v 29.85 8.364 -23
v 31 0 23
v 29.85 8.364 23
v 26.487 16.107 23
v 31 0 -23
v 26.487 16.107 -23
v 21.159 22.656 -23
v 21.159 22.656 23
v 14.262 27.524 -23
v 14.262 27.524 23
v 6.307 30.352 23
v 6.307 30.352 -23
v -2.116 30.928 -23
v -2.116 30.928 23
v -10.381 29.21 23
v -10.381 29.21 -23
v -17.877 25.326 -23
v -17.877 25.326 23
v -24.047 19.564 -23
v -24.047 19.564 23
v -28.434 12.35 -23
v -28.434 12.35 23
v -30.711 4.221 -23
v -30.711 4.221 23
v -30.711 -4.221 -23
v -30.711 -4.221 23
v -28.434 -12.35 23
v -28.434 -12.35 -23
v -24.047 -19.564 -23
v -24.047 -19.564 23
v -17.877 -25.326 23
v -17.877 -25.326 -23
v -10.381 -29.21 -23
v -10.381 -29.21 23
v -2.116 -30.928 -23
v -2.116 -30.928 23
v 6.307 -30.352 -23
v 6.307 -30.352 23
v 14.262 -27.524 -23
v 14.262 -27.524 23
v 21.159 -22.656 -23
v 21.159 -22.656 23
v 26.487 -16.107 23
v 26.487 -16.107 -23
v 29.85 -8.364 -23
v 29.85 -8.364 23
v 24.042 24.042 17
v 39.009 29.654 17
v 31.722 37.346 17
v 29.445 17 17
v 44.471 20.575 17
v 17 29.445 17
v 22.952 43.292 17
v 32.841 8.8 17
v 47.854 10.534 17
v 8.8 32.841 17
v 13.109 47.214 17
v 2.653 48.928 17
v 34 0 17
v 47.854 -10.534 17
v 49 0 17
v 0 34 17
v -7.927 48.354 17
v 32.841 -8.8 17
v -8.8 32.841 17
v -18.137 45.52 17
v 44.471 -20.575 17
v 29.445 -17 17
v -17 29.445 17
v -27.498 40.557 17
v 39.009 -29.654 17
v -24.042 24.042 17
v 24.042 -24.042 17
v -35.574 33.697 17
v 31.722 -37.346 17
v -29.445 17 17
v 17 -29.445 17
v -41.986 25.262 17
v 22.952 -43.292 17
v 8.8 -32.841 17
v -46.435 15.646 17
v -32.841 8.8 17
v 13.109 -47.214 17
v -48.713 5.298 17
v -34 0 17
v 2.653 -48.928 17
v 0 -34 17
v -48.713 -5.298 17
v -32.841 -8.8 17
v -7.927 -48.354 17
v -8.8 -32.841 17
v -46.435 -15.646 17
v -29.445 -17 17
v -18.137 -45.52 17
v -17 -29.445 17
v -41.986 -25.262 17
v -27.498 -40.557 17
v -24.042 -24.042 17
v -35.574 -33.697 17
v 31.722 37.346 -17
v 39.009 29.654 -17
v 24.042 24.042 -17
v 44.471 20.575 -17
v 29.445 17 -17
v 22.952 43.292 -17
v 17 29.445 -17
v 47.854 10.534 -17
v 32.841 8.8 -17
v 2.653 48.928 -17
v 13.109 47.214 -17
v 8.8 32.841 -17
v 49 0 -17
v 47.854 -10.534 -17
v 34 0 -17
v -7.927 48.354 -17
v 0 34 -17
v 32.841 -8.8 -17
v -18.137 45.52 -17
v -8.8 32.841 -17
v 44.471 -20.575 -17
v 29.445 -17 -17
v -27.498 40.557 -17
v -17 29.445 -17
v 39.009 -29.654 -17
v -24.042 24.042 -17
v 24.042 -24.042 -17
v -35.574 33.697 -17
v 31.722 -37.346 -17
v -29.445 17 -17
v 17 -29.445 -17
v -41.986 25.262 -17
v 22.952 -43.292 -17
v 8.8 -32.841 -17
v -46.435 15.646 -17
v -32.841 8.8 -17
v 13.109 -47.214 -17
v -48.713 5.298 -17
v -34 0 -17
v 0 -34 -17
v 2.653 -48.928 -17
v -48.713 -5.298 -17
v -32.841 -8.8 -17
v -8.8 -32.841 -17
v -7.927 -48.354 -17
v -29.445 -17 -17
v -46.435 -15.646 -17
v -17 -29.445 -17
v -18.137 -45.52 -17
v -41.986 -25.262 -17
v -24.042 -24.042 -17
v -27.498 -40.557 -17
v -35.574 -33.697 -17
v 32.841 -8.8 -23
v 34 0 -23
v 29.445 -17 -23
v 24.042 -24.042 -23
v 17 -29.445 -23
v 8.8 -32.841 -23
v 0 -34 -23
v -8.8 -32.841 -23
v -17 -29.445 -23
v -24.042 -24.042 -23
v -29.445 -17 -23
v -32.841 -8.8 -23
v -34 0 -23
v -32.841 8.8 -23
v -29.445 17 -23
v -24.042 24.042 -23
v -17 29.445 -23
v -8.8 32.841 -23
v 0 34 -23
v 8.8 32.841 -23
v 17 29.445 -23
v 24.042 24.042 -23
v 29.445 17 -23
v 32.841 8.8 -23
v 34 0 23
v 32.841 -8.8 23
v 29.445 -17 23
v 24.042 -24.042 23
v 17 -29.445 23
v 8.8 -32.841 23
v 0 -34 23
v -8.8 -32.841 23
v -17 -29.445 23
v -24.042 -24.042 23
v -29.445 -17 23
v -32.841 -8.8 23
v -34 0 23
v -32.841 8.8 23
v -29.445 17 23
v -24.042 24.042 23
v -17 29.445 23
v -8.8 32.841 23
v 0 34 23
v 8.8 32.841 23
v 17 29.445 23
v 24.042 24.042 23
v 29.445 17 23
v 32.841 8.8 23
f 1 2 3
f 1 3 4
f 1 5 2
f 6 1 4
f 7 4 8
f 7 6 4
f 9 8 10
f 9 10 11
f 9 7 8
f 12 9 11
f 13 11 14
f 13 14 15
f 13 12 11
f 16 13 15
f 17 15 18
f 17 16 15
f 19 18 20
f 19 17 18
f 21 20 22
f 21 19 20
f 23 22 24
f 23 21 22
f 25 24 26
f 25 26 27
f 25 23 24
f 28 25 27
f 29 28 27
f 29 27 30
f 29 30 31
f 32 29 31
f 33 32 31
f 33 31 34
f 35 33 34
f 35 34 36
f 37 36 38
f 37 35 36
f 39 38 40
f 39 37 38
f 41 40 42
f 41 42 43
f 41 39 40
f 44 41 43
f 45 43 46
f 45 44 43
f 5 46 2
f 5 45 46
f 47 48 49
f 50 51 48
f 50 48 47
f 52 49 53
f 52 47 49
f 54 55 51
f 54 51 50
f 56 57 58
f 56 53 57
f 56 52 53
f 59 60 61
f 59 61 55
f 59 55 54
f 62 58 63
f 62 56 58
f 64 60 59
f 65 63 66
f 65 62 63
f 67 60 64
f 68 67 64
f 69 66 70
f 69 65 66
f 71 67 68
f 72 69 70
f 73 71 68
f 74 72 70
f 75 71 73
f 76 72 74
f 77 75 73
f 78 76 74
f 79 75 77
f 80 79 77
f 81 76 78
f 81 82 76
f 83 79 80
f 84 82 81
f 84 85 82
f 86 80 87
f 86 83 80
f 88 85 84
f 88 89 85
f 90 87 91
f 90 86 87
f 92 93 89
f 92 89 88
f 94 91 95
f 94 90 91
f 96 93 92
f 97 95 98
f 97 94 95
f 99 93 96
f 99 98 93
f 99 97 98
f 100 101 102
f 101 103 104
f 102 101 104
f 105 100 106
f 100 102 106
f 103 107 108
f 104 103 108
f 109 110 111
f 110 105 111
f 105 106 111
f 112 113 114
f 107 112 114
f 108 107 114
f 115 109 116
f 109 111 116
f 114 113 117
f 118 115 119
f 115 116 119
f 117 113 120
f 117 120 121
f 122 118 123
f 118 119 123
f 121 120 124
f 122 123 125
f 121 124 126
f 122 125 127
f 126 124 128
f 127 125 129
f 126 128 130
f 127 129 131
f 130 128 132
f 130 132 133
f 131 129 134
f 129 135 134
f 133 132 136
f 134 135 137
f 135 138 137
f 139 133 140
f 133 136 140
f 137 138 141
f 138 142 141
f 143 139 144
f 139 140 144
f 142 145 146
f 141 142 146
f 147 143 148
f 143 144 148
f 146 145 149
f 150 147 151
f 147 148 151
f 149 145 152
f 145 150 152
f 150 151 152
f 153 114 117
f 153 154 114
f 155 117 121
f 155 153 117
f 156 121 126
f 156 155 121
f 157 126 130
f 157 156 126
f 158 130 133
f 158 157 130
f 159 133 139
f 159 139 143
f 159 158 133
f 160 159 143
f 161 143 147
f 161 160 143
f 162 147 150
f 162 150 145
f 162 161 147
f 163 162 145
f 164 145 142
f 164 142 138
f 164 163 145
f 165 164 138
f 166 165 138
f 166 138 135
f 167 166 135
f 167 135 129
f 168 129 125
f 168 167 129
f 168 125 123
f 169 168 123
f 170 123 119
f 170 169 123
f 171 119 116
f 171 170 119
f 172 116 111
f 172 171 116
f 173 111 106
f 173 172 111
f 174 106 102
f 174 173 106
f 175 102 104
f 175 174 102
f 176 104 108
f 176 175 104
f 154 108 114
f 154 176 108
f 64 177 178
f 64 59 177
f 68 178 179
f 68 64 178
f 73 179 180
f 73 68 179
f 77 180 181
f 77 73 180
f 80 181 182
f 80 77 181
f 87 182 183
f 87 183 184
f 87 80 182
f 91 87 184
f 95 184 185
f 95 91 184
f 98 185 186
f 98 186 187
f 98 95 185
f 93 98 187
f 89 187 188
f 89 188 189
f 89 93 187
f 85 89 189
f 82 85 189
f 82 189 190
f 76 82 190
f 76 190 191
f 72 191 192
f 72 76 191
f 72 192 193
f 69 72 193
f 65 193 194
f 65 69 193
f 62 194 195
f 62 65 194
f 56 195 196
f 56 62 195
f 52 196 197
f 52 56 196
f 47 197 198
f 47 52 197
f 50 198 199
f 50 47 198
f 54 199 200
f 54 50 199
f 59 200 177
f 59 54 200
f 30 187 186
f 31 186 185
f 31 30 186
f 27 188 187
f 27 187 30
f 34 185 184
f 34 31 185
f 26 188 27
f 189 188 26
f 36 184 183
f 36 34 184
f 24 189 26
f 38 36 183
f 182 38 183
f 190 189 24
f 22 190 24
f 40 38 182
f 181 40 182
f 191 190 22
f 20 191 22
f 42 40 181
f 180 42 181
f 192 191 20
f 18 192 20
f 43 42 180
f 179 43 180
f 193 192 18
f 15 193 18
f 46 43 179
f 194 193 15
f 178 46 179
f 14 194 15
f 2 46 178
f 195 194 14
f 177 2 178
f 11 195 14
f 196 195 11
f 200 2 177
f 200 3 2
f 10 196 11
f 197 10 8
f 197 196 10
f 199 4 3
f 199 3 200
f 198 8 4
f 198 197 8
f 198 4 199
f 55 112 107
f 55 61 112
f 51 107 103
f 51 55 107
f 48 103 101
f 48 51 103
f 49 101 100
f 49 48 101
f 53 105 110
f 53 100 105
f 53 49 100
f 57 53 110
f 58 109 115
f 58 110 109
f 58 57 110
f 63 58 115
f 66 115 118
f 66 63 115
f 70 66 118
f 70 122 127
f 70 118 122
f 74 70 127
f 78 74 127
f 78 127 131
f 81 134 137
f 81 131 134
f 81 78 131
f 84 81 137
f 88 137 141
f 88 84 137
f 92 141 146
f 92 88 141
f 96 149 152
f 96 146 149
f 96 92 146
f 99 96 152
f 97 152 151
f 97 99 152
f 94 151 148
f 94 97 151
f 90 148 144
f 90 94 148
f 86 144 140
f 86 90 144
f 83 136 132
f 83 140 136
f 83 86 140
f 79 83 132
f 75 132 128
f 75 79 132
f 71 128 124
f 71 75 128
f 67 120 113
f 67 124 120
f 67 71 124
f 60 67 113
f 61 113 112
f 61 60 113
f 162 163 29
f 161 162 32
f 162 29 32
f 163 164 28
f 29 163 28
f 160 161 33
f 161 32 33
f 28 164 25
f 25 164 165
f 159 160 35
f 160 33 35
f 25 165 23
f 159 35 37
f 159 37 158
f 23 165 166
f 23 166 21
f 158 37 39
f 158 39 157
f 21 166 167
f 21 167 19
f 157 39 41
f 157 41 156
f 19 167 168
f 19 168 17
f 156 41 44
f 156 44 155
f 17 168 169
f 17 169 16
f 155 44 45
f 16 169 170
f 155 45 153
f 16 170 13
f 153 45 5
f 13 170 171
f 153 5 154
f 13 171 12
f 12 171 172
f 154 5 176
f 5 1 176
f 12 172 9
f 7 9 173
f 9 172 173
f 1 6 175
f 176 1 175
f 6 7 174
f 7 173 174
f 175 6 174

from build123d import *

# Parameters (mm, degrees)
SCHIZZO1_R        = 49
SCHIZZO1_R_2      = 31
ESTRUSIONE1_DEPTH = 23
SCHIZZO4_W        = 15
SCHIZZO4_H        = 6


with BuildPart() as part:
    # Schizzo1 → Estrusione1 (new, symmetric)
    with BuildSketch(Plane.XY):
        Circle(SCHIZZO1_R)
        Circle(SCHIZZO1_R_2, mode=Mode.SUBTRACT)
    extrude(amount=ESTRUSIONE1_DEPTH, both=True)

    # Schizzo4 → Taglia-Rivoluzione1 (revolve, cut)
    with BuildSketch(Plane(origin=(0, 0, 0), x_dir=(1, 0, 0), z_dir=(0, 1, 0))):
        with Locations((41.5, 20)):
            Rectangle(SCHIZZO4_W, SCHIZZO4_H)
        with Locations((41.5, -20)):
            Rectangle(SCHIZZO4_W, SCHIZZO4_H)
    revolve(axis=Axis((0, 0, 23), (0, 0, -1)), mode=Mode.SUBTRACT)


solid = part.part
